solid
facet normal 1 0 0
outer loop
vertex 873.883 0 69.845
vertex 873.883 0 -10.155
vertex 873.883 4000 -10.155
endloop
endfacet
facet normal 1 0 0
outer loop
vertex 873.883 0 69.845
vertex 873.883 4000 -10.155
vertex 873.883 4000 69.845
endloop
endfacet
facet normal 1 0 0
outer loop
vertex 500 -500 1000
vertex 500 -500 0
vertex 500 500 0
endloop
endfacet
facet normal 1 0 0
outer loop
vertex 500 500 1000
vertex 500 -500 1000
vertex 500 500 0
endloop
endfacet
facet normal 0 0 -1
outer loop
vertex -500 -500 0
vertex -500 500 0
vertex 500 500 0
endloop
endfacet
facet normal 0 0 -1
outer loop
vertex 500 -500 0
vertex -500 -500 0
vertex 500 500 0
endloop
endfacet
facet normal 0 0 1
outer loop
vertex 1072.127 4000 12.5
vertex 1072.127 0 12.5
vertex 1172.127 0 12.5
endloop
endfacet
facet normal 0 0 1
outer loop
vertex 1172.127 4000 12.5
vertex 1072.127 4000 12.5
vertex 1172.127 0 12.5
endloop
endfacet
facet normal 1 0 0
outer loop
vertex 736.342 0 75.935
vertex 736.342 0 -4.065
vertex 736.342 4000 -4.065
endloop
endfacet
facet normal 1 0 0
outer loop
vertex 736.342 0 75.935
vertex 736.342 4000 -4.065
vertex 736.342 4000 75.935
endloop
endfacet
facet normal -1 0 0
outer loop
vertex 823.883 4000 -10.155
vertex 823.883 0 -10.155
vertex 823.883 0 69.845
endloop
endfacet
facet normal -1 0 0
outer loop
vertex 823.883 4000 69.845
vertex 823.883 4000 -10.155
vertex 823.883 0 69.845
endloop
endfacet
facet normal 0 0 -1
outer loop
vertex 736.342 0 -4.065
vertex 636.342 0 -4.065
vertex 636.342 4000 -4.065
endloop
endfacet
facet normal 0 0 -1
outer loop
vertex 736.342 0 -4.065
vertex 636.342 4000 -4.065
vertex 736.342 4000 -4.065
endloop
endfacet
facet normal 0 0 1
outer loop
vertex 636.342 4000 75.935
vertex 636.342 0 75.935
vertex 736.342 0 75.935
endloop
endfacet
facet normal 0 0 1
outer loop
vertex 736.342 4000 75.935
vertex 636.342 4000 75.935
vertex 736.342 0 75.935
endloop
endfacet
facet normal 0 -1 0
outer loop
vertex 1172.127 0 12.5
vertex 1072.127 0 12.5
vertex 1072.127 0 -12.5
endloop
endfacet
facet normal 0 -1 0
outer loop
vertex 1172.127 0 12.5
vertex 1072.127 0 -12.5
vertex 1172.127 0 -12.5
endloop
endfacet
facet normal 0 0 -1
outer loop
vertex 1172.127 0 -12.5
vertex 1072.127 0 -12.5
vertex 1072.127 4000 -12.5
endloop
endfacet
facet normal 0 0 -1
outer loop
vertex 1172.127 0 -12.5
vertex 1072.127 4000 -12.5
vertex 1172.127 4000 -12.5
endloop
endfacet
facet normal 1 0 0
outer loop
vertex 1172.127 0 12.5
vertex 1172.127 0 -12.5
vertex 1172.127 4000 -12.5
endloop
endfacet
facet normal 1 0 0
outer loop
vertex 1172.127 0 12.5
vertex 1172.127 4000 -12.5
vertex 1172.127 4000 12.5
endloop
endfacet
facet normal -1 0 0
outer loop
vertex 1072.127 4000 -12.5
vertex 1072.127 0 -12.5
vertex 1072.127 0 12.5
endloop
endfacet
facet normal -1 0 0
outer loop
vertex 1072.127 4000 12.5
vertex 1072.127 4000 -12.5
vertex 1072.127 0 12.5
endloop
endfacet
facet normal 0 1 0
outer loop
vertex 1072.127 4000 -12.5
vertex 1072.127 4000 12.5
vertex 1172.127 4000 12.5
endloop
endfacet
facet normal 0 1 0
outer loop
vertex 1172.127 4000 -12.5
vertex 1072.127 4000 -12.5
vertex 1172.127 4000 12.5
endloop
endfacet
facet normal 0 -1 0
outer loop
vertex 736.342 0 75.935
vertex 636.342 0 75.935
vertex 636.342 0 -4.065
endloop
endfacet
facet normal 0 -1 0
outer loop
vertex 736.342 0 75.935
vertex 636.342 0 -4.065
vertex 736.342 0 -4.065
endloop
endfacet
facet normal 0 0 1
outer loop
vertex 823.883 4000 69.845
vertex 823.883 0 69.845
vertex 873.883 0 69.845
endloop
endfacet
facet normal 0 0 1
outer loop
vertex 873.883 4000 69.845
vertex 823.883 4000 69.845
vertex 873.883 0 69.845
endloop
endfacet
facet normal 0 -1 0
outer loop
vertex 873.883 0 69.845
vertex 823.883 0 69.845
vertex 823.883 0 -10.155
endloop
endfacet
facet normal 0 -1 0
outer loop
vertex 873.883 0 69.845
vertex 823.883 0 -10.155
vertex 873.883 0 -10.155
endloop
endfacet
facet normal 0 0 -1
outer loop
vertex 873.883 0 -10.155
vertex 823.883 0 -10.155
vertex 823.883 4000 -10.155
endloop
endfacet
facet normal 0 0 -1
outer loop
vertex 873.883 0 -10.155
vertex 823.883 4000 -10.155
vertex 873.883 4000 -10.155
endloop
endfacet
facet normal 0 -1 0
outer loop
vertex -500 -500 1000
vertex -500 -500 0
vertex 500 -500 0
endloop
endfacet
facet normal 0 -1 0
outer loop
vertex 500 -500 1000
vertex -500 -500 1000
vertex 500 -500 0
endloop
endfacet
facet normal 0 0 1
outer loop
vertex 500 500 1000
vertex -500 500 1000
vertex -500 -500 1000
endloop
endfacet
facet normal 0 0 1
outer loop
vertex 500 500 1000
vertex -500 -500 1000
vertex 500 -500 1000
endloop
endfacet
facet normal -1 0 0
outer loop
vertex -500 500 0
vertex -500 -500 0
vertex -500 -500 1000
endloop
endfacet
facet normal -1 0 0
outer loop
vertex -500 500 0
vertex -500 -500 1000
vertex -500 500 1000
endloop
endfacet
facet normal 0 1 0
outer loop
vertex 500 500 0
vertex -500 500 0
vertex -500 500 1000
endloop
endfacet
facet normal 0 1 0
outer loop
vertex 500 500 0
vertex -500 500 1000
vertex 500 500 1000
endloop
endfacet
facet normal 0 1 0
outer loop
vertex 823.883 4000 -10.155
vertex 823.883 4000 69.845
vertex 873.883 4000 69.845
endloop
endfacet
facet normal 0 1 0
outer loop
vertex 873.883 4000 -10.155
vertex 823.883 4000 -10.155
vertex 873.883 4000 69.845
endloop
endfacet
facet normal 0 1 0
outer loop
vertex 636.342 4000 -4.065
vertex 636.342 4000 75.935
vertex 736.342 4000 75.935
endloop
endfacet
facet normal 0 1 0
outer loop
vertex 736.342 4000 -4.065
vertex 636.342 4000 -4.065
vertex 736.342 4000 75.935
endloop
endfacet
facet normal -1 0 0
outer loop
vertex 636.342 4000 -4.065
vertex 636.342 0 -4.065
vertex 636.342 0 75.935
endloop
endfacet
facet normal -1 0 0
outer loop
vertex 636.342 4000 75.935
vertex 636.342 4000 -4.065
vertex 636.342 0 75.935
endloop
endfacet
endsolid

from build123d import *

# Parameters (mm, degrees)
F0_W     = 1000
F0_H     = 1000
F1_DEPTH = 1000
F2_W     = 100
F2_H     = 80
F2_W_2   = 50
F2_H_2   = 25
F3_DEPTH = 4000


with BuildPart() as f1:
    # F0 (on Top) → F1 (new body)
    with BuildSketch(Plane.XY):
        Rectangle(F0_W, F0_H)
    extrude(amount=F1_DEPTH)


with BuildPart() as f3:
    # F2 (on Front) → F3 (new body)
    with BuildSketch(Plane.XZ):
        with Locations((686.342341, 35.93486)):
            Rectangle(F2_W, F2_H)
        with Locations((848.883355, 29.844633)):
            Rectangle(F2_W_2, F2_H)
        with Locations((1122.126705, 0)):
            Rectangle(F2_W, F2_H_2)
    extrude(amount=-F3_DEPTH)


solid = Compound([f1.part, f3.part])
